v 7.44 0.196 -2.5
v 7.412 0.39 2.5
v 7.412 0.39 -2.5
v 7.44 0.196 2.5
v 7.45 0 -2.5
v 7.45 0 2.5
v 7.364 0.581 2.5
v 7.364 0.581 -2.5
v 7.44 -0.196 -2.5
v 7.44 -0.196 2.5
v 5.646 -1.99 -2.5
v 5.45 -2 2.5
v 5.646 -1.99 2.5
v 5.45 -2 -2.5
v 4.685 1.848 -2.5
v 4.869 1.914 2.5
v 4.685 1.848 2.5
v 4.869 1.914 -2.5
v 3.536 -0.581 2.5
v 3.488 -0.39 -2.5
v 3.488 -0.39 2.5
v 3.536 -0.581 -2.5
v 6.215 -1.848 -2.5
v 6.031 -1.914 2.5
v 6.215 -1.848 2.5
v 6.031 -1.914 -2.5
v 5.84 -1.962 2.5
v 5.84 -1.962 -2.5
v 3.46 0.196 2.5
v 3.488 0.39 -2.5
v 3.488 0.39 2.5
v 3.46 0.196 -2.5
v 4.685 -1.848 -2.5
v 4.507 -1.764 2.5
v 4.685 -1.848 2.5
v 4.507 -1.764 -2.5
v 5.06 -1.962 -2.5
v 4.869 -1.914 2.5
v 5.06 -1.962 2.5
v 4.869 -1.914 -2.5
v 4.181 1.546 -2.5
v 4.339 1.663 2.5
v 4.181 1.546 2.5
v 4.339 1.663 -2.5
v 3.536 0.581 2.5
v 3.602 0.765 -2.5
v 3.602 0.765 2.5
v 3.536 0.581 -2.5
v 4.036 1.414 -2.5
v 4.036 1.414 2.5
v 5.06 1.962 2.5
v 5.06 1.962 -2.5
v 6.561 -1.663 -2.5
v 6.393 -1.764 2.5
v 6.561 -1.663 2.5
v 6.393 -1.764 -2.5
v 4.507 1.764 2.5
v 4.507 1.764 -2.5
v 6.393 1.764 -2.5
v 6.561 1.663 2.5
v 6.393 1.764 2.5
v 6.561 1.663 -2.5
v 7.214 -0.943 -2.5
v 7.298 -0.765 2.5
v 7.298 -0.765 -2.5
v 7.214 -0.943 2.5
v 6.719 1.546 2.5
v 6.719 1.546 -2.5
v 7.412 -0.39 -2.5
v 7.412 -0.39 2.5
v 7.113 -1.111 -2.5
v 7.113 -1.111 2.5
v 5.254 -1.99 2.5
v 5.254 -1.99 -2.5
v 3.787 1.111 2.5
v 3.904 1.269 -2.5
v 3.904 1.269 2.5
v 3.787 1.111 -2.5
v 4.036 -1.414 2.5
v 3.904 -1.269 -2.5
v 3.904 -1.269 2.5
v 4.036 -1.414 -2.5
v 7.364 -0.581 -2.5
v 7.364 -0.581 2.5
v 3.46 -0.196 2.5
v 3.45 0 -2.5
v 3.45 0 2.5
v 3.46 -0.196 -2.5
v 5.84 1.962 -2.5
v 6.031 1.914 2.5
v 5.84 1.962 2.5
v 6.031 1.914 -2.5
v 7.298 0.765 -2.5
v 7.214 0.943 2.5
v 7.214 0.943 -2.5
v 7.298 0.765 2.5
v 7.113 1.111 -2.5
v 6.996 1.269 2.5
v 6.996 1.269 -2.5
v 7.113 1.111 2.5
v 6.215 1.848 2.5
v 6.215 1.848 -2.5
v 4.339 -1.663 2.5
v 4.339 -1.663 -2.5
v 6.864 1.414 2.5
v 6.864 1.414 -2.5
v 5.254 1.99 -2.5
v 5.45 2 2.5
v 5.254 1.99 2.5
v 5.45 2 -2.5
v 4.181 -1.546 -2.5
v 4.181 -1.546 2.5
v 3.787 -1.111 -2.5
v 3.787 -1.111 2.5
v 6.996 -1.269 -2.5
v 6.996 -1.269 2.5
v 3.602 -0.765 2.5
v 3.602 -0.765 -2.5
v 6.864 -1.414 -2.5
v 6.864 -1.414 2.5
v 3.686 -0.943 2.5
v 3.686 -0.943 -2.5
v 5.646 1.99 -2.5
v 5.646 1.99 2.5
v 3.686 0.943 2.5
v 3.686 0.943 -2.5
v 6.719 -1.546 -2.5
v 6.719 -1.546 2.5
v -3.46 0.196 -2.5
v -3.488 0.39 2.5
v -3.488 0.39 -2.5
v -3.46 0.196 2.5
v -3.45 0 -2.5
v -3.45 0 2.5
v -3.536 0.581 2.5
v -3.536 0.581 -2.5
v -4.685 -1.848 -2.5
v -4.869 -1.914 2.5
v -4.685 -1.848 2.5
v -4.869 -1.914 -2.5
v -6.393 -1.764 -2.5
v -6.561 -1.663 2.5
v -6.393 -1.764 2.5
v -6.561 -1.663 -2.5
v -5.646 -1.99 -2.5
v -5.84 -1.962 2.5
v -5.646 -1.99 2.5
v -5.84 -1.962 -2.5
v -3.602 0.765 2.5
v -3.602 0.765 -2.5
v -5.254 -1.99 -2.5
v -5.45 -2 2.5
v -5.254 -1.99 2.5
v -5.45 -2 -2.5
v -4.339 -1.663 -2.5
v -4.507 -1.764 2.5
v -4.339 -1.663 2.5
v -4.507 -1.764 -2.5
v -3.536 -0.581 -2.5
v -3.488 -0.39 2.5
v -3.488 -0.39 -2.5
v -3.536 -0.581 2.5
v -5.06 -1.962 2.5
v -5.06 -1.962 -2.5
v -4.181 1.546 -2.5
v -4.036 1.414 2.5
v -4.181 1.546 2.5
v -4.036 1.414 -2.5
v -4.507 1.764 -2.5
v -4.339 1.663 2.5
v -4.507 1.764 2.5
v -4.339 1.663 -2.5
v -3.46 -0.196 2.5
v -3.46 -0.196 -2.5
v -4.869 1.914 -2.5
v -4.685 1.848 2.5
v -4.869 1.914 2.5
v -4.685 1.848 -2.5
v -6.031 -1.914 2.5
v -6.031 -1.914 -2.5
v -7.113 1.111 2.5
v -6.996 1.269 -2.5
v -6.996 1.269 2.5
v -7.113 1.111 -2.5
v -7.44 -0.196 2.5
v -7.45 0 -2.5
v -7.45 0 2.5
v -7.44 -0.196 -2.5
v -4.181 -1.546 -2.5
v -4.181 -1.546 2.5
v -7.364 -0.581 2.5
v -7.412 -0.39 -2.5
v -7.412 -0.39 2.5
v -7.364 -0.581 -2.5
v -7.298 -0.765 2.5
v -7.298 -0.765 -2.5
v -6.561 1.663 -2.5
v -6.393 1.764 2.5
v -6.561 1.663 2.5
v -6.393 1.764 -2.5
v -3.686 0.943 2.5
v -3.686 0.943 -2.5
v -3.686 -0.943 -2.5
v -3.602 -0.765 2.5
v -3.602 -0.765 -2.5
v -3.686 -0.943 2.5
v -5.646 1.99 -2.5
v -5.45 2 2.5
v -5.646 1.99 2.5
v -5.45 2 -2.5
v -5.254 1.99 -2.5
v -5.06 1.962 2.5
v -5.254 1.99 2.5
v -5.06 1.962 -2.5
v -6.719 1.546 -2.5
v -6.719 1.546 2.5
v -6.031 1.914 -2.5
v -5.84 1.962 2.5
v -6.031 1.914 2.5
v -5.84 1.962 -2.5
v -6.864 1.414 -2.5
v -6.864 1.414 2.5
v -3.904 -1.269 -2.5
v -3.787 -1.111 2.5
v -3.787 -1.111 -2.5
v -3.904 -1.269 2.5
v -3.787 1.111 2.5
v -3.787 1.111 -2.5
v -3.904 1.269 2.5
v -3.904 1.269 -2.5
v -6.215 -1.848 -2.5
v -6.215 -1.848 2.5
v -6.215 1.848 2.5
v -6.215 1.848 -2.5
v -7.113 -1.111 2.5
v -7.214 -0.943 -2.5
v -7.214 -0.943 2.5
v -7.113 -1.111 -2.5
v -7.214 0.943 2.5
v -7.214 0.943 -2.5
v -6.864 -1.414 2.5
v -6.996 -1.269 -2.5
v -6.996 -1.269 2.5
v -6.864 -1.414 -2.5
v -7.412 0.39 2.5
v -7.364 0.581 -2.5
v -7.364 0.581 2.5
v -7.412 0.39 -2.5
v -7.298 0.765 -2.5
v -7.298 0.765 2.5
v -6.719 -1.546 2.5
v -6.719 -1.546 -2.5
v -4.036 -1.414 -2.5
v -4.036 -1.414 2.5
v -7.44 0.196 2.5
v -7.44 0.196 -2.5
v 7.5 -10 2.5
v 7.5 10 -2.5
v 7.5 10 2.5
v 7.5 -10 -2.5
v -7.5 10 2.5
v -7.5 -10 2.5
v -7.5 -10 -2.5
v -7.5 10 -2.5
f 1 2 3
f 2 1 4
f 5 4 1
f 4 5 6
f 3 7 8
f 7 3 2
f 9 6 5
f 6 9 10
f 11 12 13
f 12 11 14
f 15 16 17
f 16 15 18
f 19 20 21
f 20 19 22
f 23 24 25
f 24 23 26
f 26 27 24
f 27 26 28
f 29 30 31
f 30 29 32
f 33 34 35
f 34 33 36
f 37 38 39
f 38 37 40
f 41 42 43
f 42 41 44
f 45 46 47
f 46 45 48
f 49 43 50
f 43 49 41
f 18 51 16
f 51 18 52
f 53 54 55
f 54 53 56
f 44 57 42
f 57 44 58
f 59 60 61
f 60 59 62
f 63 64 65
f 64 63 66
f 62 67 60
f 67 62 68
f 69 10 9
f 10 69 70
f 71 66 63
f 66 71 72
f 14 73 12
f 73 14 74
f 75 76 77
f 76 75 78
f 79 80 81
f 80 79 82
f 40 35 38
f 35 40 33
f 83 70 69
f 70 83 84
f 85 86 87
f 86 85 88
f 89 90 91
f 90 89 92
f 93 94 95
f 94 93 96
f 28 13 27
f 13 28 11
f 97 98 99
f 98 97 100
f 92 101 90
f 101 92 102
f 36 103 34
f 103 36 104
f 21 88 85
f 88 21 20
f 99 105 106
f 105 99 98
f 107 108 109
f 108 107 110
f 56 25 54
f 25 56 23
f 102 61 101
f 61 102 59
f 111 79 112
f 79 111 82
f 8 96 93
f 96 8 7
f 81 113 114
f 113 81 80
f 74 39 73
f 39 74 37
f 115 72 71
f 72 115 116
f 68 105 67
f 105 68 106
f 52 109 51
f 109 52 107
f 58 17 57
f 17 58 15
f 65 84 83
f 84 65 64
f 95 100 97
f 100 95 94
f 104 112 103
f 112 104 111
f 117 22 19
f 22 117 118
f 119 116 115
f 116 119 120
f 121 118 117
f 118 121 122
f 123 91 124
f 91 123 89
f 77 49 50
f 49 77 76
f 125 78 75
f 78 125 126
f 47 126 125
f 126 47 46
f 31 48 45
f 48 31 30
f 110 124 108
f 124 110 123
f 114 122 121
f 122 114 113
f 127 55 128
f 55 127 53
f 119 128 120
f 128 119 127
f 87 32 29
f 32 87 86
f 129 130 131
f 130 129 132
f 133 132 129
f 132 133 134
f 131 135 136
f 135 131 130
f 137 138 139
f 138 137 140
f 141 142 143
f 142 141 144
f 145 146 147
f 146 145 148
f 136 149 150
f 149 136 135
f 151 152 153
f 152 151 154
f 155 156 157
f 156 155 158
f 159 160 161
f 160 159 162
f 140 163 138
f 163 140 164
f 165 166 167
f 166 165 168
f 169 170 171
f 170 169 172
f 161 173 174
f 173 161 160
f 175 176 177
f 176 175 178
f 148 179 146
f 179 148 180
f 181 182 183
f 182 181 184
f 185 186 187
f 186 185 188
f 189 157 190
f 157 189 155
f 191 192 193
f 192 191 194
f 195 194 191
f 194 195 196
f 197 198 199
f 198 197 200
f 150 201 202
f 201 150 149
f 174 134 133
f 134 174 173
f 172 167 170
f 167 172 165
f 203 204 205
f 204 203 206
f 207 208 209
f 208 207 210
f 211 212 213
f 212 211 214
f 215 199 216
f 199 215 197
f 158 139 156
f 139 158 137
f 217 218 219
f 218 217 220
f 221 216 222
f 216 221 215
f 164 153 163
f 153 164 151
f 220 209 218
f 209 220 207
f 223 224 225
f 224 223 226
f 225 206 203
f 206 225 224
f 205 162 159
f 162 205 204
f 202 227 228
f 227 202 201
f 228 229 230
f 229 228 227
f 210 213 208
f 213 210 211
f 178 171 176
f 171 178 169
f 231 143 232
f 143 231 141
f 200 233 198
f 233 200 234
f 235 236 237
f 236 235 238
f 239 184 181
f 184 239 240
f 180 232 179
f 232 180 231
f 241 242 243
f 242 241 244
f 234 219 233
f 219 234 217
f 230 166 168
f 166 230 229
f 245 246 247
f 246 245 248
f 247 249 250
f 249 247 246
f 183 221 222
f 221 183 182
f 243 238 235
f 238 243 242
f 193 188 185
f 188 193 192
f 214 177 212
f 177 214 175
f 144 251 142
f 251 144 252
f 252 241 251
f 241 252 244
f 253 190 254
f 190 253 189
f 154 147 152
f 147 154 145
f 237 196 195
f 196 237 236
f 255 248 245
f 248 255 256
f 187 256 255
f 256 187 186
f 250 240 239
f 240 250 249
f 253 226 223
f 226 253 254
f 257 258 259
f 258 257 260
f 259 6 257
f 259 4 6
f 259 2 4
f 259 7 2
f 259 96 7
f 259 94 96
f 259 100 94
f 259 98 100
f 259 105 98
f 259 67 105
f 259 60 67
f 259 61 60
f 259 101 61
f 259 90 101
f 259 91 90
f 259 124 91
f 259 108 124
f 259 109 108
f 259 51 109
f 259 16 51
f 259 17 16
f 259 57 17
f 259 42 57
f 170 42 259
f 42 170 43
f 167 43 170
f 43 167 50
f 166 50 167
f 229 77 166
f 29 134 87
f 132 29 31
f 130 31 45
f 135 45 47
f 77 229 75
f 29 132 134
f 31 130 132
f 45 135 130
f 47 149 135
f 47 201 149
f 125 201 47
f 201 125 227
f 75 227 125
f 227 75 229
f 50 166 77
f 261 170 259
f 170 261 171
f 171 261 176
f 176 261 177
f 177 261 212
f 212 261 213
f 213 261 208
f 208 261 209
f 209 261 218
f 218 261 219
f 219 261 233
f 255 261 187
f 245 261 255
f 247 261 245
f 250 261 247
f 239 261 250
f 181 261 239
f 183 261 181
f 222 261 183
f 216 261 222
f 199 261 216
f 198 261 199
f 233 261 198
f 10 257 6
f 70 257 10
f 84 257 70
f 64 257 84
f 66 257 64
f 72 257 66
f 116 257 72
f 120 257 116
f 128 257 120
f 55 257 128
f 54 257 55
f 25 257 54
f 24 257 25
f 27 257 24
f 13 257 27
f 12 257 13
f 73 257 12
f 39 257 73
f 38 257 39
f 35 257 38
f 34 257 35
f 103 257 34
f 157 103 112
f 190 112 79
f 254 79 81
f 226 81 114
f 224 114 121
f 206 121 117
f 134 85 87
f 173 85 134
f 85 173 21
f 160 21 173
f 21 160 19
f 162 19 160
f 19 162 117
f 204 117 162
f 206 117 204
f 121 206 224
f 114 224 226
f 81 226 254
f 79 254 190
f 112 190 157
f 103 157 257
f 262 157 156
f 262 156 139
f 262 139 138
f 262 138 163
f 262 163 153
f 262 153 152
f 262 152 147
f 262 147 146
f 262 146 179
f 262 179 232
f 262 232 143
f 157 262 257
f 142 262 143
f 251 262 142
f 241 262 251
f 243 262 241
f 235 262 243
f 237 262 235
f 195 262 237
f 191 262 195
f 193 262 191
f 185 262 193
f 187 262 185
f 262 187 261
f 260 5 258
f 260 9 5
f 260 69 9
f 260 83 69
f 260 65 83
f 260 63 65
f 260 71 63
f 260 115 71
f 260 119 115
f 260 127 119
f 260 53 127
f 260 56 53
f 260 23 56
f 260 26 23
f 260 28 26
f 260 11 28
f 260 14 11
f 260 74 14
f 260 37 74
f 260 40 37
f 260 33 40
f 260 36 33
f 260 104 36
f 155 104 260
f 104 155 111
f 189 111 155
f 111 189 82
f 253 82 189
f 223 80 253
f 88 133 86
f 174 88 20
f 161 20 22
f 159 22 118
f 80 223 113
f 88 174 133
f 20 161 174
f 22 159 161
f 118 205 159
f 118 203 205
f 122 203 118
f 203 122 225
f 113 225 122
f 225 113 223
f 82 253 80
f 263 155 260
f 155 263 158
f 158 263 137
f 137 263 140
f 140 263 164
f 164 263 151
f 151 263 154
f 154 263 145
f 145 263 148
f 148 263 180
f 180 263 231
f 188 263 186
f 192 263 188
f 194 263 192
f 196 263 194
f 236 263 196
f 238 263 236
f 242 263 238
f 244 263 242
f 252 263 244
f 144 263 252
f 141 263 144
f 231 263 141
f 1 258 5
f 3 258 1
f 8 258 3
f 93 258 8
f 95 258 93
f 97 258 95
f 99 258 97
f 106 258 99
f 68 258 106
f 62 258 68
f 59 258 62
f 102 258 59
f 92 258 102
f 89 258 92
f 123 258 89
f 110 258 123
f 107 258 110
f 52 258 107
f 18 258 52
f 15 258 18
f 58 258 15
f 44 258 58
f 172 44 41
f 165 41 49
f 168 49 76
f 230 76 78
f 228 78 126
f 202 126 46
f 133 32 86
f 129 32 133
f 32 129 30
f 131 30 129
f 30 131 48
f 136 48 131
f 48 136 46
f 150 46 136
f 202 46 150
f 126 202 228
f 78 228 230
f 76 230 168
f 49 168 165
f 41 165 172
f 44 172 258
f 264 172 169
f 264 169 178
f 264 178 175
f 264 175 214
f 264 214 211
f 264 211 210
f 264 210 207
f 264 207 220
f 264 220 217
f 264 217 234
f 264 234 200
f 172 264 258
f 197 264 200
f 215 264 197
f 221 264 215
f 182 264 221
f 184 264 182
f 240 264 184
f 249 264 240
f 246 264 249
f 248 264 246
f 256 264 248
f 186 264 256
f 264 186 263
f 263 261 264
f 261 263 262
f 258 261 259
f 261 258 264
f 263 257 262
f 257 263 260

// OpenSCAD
$fn = 64;

W = 15;
L = 20;
H = 5;
HR = 2;
HL = 10.9/2;

module car_camera() {
    difference() {
        union() {
            cube([W, L, H], center=true);
        }
        union() {
            translate([+HL, 0, 0]) cylinder(r=HR, h=50, center=true);;
            translate([-HL, 0, 0]) cylinder(r=HR, h=50, center=true);;
        }
    }
}

car_camera();
